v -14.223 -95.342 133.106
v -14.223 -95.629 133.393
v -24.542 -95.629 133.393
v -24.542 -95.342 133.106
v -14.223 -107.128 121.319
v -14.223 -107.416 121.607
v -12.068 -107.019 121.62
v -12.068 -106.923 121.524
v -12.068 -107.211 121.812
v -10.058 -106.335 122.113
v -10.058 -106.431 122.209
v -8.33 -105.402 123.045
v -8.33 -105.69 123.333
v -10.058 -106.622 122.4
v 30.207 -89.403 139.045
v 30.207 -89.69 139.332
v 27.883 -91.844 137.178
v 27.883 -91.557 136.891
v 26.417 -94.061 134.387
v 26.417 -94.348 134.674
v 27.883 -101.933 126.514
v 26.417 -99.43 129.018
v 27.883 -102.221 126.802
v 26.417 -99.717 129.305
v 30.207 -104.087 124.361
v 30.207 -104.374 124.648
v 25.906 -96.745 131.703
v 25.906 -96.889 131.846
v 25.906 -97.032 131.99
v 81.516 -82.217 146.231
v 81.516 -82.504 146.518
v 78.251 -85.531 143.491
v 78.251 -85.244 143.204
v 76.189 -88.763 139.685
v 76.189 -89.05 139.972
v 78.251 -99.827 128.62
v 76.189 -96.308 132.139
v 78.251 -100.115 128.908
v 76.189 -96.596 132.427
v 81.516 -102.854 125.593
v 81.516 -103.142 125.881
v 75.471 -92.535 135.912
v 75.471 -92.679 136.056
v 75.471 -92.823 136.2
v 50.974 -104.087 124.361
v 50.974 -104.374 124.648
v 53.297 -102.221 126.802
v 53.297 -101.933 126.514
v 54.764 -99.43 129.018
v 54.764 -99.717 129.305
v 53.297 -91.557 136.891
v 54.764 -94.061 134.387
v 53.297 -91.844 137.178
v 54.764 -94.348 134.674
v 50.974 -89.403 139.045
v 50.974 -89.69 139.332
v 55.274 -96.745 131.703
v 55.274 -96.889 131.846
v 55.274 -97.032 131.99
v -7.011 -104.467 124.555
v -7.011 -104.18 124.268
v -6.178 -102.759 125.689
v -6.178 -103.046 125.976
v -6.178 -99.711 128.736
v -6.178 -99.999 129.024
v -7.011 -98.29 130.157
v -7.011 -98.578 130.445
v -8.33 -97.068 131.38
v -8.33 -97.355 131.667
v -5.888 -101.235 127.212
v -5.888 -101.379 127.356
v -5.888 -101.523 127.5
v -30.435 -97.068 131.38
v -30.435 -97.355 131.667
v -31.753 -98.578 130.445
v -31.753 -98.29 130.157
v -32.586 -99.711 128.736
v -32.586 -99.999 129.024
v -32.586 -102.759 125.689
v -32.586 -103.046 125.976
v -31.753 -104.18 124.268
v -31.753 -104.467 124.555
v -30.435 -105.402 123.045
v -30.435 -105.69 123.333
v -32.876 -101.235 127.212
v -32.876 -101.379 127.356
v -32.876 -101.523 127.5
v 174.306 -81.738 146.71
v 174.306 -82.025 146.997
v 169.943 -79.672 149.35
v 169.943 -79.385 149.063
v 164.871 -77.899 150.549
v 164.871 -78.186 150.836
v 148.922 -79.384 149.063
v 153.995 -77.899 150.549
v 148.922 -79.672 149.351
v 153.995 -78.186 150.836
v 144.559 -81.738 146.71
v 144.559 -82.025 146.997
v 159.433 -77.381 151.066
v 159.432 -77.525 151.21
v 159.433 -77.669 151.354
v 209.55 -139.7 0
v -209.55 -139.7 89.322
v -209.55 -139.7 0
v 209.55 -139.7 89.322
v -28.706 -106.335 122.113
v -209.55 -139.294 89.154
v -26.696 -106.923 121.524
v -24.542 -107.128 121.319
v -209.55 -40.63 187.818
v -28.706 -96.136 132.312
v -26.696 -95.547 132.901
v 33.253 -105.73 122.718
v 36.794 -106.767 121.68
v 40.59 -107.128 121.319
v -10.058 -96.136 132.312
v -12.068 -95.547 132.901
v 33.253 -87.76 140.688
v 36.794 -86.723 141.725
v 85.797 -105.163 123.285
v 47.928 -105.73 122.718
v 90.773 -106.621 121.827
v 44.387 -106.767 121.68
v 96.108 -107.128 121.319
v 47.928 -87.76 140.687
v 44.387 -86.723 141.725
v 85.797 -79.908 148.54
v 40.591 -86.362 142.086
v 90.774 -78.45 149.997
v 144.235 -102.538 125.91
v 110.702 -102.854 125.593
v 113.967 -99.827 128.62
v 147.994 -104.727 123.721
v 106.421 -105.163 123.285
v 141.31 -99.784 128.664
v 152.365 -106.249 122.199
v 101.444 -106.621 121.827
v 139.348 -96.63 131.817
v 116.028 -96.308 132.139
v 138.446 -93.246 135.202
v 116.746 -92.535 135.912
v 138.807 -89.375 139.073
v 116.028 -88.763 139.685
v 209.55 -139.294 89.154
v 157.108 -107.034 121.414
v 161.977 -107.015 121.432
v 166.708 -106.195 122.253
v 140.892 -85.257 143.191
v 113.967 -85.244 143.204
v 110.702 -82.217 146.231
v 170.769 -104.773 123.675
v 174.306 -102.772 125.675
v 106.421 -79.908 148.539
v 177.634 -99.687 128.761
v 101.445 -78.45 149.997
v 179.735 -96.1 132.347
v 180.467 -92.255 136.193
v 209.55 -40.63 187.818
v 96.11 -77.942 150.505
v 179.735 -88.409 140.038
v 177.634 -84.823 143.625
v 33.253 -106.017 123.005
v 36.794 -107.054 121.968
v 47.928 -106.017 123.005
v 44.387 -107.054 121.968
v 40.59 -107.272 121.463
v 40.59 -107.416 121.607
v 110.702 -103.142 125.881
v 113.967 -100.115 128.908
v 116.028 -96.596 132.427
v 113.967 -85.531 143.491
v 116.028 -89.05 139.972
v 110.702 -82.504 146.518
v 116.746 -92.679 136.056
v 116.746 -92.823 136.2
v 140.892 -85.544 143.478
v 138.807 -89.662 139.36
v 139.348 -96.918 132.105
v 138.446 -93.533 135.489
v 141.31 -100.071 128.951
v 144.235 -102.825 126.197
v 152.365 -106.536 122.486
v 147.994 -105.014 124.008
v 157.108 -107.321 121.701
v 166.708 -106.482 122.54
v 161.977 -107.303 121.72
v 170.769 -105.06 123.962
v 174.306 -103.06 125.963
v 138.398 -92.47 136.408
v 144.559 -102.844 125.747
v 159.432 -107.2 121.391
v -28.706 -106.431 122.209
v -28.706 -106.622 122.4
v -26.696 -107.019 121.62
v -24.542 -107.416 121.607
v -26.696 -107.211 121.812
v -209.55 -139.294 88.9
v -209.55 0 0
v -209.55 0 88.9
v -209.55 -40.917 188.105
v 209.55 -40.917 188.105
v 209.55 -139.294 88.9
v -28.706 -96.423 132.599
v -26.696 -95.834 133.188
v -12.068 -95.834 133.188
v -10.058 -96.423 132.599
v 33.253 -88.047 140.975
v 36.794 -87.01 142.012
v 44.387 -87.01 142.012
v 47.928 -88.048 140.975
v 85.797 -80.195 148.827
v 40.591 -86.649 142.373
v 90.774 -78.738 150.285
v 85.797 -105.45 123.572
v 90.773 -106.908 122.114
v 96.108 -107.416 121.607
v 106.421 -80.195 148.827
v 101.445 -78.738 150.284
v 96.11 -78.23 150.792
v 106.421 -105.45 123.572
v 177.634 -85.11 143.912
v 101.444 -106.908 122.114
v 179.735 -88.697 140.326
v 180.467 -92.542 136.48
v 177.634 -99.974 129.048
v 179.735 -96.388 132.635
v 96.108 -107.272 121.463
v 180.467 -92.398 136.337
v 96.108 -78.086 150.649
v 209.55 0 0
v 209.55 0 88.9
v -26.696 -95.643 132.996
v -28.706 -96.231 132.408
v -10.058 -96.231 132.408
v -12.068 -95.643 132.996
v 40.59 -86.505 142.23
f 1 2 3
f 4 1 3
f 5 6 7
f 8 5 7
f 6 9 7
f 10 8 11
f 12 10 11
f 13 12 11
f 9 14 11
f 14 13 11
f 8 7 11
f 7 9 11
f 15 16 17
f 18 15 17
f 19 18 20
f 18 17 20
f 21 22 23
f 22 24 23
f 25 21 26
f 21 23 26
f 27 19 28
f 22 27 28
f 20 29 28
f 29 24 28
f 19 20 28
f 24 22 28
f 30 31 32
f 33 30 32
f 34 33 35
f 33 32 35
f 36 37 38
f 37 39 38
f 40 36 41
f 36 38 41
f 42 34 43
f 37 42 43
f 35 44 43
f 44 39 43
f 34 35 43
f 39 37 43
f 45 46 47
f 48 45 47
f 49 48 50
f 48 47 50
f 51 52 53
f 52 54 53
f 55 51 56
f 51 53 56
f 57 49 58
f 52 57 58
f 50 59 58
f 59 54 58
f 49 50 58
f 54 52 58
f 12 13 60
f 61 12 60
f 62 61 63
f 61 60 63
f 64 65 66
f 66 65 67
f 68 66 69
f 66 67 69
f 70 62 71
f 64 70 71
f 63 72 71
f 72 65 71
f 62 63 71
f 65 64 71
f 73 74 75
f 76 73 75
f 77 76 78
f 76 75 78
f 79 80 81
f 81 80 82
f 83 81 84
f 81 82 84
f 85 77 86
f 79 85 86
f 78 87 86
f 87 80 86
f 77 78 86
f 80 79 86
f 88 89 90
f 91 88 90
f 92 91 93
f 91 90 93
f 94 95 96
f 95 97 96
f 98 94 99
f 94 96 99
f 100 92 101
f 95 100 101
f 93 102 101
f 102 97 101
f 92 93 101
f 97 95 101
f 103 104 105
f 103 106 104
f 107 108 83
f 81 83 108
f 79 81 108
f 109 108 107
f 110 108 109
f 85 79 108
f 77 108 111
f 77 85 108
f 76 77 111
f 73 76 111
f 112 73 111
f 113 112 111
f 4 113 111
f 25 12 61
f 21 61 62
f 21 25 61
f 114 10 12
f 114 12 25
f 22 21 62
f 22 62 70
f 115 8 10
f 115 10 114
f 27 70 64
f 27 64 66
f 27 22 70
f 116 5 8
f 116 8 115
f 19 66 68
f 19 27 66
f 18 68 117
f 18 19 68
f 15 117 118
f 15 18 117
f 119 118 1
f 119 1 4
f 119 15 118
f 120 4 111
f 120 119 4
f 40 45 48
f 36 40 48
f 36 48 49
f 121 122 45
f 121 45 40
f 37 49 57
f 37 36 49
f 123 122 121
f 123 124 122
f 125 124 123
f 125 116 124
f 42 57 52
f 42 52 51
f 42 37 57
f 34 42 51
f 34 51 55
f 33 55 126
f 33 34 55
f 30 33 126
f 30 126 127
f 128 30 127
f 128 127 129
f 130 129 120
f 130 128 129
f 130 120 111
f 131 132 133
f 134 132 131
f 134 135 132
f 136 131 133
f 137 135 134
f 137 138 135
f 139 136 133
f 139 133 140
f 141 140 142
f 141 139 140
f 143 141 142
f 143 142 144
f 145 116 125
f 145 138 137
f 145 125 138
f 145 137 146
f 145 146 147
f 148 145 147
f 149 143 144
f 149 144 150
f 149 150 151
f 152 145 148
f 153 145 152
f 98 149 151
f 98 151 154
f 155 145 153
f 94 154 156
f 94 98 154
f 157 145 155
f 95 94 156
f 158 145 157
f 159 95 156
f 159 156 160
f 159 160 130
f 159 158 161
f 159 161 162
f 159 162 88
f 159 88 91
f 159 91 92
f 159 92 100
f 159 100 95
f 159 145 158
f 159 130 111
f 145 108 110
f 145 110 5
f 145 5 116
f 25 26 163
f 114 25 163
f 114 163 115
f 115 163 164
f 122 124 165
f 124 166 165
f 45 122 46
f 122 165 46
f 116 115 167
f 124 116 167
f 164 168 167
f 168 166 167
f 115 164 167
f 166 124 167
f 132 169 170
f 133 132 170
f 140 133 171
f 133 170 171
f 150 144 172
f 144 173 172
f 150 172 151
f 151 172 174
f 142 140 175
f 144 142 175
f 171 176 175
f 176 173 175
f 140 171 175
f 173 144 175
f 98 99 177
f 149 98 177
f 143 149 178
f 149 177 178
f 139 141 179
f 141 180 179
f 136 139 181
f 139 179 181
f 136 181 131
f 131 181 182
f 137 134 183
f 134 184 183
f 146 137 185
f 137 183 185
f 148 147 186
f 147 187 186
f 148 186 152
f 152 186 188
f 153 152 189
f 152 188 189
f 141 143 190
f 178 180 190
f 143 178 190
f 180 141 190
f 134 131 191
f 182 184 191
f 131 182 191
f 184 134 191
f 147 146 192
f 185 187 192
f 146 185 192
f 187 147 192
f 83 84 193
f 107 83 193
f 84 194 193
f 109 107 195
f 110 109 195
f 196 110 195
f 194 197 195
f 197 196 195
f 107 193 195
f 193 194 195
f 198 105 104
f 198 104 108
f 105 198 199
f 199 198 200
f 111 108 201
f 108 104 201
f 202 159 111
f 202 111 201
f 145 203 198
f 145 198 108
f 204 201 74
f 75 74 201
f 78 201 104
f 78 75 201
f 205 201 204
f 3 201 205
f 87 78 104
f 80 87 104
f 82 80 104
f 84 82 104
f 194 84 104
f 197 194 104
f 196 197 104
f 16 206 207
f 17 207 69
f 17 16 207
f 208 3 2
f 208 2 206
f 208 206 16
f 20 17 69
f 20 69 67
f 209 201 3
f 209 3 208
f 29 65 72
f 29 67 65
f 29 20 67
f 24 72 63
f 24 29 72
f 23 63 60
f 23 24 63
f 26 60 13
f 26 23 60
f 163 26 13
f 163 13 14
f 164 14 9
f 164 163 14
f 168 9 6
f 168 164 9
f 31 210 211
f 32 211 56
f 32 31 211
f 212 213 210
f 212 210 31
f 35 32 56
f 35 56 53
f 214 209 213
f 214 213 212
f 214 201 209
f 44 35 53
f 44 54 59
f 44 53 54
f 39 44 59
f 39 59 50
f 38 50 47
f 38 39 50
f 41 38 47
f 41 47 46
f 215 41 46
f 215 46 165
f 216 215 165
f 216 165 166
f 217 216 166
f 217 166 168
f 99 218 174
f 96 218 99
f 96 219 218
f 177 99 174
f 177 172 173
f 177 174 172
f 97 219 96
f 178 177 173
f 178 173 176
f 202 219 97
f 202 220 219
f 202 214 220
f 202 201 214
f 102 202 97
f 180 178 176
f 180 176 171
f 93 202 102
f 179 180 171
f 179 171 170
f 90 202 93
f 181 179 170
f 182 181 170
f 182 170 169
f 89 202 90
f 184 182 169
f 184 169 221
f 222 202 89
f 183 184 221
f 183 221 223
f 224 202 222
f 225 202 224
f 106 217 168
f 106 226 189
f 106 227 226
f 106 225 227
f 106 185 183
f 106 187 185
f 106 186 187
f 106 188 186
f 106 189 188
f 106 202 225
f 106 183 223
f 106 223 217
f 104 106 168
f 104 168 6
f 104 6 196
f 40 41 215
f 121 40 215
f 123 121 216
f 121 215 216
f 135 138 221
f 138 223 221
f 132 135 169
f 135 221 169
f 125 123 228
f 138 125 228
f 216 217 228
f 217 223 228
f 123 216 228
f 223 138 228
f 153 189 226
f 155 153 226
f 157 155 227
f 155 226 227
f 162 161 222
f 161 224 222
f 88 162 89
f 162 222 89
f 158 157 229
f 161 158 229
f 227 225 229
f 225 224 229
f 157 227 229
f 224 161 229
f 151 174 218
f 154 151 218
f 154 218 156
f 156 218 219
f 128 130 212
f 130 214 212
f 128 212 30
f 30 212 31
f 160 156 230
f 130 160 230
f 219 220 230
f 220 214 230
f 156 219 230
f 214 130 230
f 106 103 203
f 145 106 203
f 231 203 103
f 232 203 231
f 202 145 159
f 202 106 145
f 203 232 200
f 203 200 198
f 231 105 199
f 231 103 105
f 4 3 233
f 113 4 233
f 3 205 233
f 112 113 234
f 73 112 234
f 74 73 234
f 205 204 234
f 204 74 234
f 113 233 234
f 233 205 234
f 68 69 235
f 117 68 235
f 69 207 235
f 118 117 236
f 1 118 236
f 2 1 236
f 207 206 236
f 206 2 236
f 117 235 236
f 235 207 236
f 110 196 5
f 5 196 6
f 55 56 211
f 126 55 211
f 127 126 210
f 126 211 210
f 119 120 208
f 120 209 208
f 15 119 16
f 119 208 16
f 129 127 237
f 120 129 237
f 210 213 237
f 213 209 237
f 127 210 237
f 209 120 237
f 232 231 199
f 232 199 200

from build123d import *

# Parameters (mm, degrees)
F1_DEPTH = 209.55
F3_DEPTH = 0.4064


# Not quite as in the source:
# - the dataset's text gives a spline's control points without its knots; the knots are read off the source's solid


with BuildPart() as f1:
    # F0 (on Right) → F1 (new body, symmetric)
    with BuildSketch(Plane.YZ):
        Polygon((-139.7, 0), (0, 0), (0, 88.9), (-139.2936, 88.9), (-139.2936, 89.154), (-40.6298144724, 187.8177855276), (-40.9171826682, 188.1051537235), (-139.7, 89.3223363917), align=None)
    extrude(amount=F1_DEPTH, both=True)

    # F2 (on face) → F3 (cut, through all)
    with BuildSketch(Plane(origin=(0, -114.5111681959, 114.5111681959), x_dir=(1, 0, 0), z_dir=(0, -0.7071067812, 0.7071067812))):
        with BuildLine():
            add(Edge.make_bspline(
                [(-30.4346554714, 12.4755289708), (-28.8919356714, 10.9324789708), (-26.7232582714, 10.0343349708), (-24.5415760714, 10.0343349708)],
                knots=[3, 3, 3, 3, 4, 4, 4, 4], degree=3))
            Line((-24.5415760714, 10.0343349708), (-14.2228260714, 10.0343349708))
            add(Edge.make_bspline(
                [(-14.2228260714, 10.0343349708), (-12.0402548714, 10.0343349708), (-9.8723140714, 10.9324789708), (-8.3296196714, 12.4755289708)],
                knots=[0, 0, 0, 0, 1, 1, 1, 1], degree=3))
            add(Edge.make_bspline(
                [(-8.3296196714, 12.4755289708), (-6.7864680714, 14.0182741708), (-5.8884256714, 16.1866213708), (-5.8884256714, 18.3687099708), (-5.8884256714, 20.5508747708), (-6.7864680714, 22.7191711708), (-8.3296196714, 24.2622719708)],
                knots=[1, 1, 1, 1, 2, 2, 2, 3, 3, 3, 3], degree=3))
            add(Edge.make_bspline(
                [(-8.3296196714, 24.2622719708), (-9.8723140714, 25.8049663708), (-12.0402548714, 26.7030849708), (-14.2228260714, 26.7030849708)],
                knots=[3, 3, 3, 3, 4, 4, 4, 4], degree=3))
            Line((-14.2228260714, 26.7030849708), (-24.5415760714, 26.7030849708))
            add(Edge.make_bspline(
                [(-24.5415760714, 26.7030849708), (-26.7232582714, 26.7030849708), (-28.8919356714, 25.8049663708), (-30.4346554714, 24.2622719708)],
                knots=[0, 0, 0, 0, 1, 1, 1, 1], degree=3))
            add(Edge.make_bspline(
                [(-30.4346554714, 24.2622719708), (-31.9773752714, 22.7191711708), (-32.8759510714, 20.5508747708), (-32.8759510714, 18.3687099708), (-32.8759510714, 16.1866213708), (-31.9773752714, 14.0182741708), (-30.4346554714, 12.4755289708)],
                knots=[1, 1, 1, 1, 2, 2, 2, 3, 3, 3, 3], degree=3))
        make_face()
        with BuildLine():
            add(Edge.make_bspline(
                [(50.9739701286, 35.1022299708), (48.2554589286, 37.8204363708), (44.4345115286, 39.4030849708), (40.5900437286, 39.4030849708)],
                knots=[7, 7, 7, 7, 8, 8, 8, 8], degree=3))
            add(Edge.make_bspline(
                [(40.5900437286, 39.4030849708), (36.7460839286, 39.4030849708), (32.9251365286, 37.8204363708), (30.2066253286, 35.1022299708)],
                knots=[0, 0, 0, 0, 1, 1, 1, 1], degree=3))
            add(Edge.make_bspline(
                [(30.2066253286, 35.1022299708), (27.4884189286, 32.3837441708), (25.9056687286, 28.5627713708), (25.9056687286, 24.7187099708), (25.9056687286, 20.8743691708), (27.4884189286, 17.0535741708), (30.2066253286, 14.3355455708)],
                knots=[1, 1, 1, 1, 2, 2, 2, 3, 3, 3, 3], degree=3))
            add(Edge.make_bspline(
                [(30.2066253286, 14.3355455708), (32.9251365286, 11.6170089708), (36.7460839286, 10.0343349708), (40.5900437286, 10.0343349708), (44.4345115286, 10.0343349708), (48.2554589286, 11.6170089708), (50.9739701286, 14.3355455708)],
                knots=[3, 3, 3, 3, 4, 4, 4, 5, 5, 5, 5], degree=3))
            add(Edge.make_bspline(
                [(50.9739701286, 14.3355455708), (53.6921765286, 17.0535741708), (55.2744187286, 20.8743691708), (55.2744187286, 24.7187099708), (55.2744187286, 28.5627713708), (53.6921765286, 32.3837441708), (50.9739701286, 35.1022299708)],
                knots=[5, 5, 5, 5, 6, 6, 6, 7, 7, 7, 7], degree=3))
        make_face()
        with BuildLine():
            add(Edge.make_bspline(
                [(110.7016129286, 45.2649223708), (106.8809957286, 49.0851839708), (101.5114865286, 51.3095127708), (96.1084493286, 51.3095127708)],
                knots=[7, 7, 7, 7, 8, 8, 8, 8], degree=3))
            add(Edge.make_bspline(
                [(96.1084493286, 51.3095127708), (90.7062757286, 51.3095127708), (85.3364109286, 49.0851839708), (81.5161493286, 45.2649223708)],
                knots=[0, 0, 0, 0, 1, 1, 1, 1], degree=3))
            add(Edge.make_bspline(
                [(81.5161493286, 45.2649223708), (77.6955067286, 41.4443305708), (75.4709493286, 36.0747705708), (75.4709493286, 30.6720127708), (75.4709493286, 25.2692549708), (77.6955067286, 19.8992123708), (81.5161493286, 16.0789507708)],
                knots=[1, 1, 1, 1, 2, 2, 2, 3, 3, 3, 3], degree=3))
            add(Edge.make_bspline(
                [(81.5161493286, 16.0789507708), (85.3364109286, 12.2585113708), (90.7062757286, 10.0345127708), (96.1084493286, 10.0345127708), (101.5114865286, 10.0345127708), (106.8809957286, 12.2585113708), (110.7016129286, 16.0789507708)],
                knots=[3, 3, 3, 3, 4, 4, 4, 5, 5, 5, 5], degree=3))
            add(Edge.make_bspline(
                [(110.7016129286, 16.0789507708), (114.5218745286, 19.8992123708), (116.7459493286, 25.2692549708), (116.7459493286, 30.6720127708), (116.7459493286, 36.0747705708), (114.5218745286, 41.4443305708), (110.7016129286, 45.2649223708)],
                knots=[5, 5, 5, 5, 6, 6, 6, 7, 7, 7, 7], degree=3))
        make_face()
        with BuildLine():
            add(Edge.make_bspline(
                [(174.3060069286, 45.9422641708), (170.4119075286, 49.8362111708), (164.9391219286, 52.1032627708), (159.4321479286, 52.1032627708)],
                knots=[7, 7, 7, 7, 8, 8, 8, 8], degree=3))
            add(Edge.make_bspline(
                [(159.4321479286, 52.1032627708), (153.9258597286, 52.1032627708), (148.4526169286, 49.8362111708), (144.5589747286, 45.9422641708)],
                knots=[0, 0, 0, 0, 1, 1, 1, 1], degree=3))
            add(Edge.make_bspline(
                [(144.5589747286, 45.9422641708), (140.6649769286, 42.0482663708), (138.3976713286, 36.5757347708), (138.3976713286, 31.0688877708), (138.3976713286, 25.5620661708), (140.6649769286, 20.0890519708), (144.5589747286, 16.1950541708), (148.4526169286, 12.3014119708), (153.9258597286, 10.0345127708), (159.4321479286, 10.0345127708), (164.9391219286, 10.0345127708), (170.4119075286, 12.3014119708), (174.3060069286, 16.1950541708)],
                knots=[1, 1, 1, 1, 2, 2, 2, 3, 3, 3, 4, 4, 4, 5, 5, 5, 5], degree=3))
            add(Edge.make_bspline(
                [(174.3060069286, 16.1950541708), (178.1996491286, 20.0890519708), (180.4665229286, 25.5620661708), (180.4665229286, 31.0688877708), (180.4665229286, 36.5757347708), (178.1996491286, 42.0482663708), (174.3060069286, 45.9422641708)],
                knots=[5, 5, 5, 5, 6, 6, 6, 7, 7, 7, 7], degree=3))
        make_face()
    extrude(amount=-F3_DEPTH, mode=Mode.SUBTRACT)


solid = f1.part
